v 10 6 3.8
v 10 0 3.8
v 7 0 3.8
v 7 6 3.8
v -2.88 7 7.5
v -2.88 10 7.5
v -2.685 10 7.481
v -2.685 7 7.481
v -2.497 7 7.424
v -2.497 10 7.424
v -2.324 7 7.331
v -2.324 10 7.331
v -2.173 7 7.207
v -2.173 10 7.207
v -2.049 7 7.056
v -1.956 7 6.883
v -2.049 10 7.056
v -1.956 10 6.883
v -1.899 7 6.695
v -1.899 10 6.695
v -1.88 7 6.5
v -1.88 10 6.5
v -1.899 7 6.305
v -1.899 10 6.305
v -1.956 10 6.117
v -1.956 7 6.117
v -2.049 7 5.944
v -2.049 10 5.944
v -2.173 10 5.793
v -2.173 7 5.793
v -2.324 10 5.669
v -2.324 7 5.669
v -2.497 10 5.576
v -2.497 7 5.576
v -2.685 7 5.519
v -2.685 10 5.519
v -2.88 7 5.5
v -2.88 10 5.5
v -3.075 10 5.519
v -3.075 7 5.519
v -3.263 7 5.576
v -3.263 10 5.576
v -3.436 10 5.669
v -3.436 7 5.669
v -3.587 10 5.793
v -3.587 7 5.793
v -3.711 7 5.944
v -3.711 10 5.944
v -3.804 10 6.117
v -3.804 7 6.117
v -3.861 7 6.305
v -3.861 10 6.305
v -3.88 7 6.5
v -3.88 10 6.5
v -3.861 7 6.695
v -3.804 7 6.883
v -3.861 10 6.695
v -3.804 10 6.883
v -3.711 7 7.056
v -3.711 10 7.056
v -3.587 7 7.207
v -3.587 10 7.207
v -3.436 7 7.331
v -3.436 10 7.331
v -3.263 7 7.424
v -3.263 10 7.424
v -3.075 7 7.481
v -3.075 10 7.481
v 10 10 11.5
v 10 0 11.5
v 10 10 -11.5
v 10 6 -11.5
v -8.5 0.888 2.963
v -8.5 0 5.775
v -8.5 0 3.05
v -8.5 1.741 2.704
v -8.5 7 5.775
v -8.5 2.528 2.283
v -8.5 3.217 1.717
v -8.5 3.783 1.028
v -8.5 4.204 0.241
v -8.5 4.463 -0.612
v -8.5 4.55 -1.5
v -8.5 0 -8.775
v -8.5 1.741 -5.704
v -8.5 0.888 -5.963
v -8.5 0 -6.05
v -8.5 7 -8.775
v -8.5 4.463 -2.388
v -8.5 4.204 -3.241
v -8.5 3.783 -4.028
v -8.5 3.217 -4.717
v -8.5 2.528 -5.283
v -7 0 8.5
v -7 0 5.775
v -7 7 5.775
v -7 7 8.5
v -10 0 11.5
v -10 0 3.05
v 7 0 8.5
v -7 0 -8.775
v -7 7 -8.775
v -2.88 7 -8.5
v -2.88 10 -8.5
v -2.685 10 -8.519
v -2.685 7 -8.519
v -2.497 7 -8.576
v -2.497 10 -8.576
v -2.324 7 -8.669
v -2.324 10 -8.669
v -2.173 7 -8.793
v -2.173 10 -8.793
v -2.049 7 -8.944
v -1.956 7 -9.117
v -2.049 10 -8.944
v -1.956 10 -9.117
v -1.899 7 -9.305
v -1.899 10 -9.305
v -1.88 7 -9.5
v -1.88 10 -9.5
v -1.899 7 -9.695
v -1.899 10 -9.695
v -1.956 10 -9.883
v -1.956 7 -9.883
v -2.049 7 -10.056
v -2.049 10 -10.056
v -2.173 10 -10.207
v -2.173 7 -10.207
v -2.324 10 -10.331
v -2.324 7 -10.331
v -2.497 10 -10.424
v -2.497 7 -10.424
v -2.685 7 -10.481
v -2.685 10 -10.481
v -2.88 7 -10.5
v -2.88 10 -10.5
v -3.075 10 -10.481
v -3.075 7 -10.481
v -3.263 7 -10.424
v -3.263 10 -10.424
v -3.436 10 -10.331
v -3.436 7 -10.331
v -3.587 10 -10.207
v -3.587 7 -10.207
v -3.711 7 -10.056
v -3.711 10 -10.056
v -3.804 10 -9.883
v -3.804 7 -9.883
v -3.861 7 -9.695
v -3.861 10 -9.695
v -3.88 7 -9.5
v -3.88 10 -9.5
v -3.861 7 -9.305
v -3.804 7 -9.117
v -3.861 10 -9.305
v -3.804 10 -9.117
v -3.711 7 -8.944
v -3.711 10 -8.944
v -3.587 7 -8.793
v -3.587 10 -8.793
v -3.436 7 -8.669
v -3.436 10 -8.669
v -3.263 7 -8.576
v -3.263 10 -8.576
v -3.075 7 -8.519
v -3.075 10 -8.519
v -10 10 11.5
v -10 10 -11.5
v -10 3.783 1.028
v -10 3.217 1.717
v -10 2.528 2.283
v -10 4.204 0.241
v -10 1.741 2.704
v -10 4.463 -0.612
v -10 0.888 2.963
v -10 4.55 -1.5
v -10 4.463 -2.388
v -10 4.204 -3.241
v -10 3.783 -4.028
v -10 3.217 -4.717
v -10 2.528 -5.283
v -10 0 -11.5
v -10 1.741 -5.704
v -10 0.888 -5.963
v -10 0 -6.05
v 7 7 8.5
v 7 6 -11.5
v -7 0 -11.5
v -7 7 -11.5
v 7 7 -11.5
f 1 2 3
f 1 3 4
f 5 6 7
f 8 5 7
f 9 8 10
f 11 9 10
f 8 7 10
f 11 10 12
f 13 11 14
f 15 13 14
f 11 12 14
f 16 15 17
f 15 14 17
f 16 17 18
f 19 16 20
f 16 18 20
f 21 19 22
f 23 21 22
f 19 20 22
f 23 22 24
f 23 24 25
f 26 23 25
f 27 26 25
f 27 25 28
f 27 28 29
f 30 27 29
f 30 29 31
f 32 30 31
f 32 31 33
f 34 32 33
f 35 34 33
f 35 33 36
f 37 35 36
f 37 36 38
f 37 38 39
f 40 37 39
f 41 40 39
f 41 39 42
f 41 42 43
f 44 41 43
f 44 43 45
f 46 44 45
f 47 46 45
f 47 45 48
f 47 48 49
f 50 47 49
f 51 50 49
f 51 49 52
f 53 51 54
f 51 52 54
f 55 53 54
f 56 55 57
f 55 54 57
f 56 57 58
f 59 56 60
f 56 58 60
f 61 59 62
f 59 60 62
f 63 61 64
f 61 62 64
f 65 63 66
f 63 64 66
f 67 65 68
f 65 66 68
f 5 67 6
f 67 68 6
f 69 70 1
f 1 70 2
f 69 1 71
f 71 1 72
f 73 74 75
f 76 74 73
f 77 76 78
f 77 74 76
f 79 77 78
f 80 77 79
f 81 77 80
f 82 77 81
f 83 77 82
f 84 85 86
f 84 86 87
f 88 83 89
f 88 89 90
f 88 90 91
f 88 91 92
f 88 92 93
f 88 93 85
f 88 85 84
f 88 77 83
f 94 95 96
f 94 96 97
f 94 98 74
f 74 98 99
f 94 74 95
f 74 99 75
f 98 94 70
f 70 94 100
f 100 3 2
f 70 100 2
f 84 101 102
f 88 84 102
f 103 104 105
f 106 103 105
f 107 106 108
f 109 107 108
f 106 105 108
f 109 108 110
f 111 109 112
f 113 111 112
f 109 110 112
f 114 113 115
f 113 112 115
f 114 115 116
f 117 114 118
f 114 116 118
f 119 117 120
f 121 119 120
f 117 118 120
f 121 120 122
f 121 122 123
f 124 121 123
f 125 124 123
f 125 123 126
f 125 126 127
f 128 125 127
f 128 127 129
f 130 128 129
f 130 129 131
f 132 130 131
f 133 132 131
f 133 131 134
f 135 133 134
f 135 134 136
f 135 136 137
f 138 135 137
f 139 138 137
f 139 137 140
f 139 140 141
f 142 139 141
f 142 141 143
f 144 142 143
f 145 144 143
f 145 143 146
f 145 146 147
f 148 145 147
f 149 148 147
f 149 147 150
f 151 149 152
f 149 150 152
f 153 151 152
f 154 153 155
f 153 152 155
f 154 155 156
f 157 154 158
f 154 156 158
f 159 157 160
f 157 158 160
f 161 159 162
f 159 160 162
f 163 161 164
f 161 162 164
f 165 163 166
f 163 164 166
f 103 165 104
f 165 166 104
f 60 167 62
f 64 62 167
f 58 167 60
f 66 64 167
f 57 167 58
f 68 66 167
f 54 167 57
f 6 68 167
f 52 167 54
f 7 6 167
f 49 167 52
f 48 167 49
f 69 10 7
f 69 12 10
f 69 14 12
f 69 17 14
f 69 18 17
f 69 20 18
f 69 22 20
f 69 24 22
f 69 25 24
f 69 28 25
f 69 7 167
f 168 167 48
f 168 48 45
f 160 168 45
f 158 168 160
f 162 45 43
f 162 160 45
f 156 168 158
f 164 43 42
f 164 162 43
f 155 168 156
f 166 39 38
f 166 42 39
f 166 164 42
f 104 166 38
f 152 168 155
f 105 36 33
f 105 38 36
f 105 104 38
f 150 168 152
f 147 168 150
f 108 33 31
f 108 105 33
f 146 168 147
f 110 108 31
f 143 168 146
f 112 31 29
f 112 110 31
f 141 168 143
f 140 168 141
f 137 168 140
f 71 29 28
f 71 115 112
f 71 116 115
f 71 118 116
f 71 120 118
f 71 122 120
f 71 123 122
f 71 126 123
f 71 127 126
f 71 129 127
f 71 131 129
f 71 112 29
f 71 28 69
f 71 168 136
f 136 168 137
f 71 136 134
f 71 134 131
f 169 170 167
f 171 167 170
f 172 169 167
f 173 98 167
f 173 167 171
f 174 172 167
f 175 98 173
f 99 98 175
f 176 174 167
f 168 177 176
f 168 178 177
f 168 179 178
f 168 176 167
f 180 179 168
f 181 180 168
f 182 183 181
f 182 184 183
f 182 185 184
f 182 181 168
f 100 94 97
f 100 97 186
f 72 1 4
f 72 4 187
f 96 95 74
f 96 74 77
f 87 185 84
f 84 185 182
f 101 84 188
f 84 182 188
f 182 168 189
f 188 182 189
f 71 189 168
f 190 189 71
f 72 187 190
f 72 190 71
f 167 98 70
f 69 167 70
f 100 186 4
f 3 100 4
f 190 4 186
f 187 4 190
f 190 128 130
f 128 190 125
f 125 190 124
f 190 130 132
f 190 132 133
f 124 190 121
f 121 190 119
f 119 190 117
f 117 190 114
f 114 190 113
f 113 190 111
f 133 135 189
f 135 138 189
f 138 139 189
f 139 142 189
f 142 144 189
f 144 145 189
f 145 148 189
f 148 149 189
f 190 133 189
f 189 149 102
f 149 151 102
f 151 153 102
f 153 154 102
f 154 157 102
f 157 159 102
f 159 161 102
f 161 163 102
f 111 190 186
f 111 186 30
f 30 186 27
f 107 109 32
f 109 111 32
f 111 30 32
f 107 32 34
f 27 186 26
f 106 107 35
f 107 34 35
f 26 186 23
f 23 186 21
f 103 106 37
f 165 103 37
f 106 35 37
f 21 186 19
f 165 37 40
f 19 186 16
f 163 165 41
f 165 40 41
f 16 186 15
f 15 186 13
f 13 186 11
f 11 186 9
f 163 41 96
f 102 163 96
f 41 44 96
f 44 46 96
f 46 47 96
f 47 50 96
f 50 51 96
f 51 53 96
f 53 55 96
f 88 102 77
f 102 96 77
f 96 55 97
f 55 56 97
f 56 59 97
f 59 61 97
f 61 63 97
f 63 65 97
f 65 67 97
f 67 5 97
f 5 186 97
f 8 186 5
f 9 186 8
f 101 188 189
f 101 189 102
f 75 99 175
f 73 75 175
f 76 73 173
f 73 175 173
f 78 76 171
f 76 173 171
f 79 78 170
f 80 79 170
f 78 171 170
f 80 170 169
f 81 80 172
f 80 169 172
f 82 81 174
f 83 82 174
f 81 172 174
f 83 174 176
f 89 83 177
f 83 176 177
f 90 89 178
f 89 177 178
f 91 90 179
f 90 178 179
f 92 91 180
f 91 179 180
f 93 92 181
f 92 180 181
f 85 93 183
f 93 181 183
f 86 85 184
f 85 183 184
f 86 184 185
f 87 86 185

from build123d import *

# Parameters (mm, degrees)
SKETCH1_W           = 20
SKETCH1_H           = 23
BOSS_EXTRUDE1_DEPTH = 10
CUT_EXTRUDE13_DEPTH = 7
SKETCH16_R          = 4.55
CUT_EXTRUDE14_DEPTH = 7
SKETCH18_W          = 14.55
SKETCH18_H          = 7
CUT_EXTRUDE16_DEPTH = 1.5
SKETCH20_R          = 1
CUT_EXTRUDE18_DEPTH = 5
SKETCH21_W          = 15.3
SKETCH21_H          = 6
CUT_EXTRUDE19_DEPTH = 5


with BuildPart() as part:
    # Sketch1 → Boss-Extrude1 (new body)
    with BuildSketch(Plane(origin=(0, 0, 0), x_dir=(1, 0, 0), z_dir=(0, 1, 0))):
        Rectangle(SKETCH1_W, SKETCH1_H)
    extrude(amount=BOSS_EXTRUDE1_DEPTH)

    # Sketch15 → Cut-Extrude13 (cut)
    with BuildSketch(Plane.XZ):
        Polygon((0, -11.5), (-7, -11.5), (-7, 8.5), (7, 8.5), (7, -11.5), align=None)
    extrude(amount=-CUT_EXTRUDE13_DEPTH, mode=Mode.SUBTRACT)

    # Sketch16 → Cut-Extrude14 (cut)
    with BuildSketch(Plane.ZY.offset(10)):
        with Locations((-1.5, 0)):
            Circle(SKETCH16_R)
    extrude(amount=-CUT_EXTRUDE14_DEPTH, mode=Mode.SUBTRACT)

    # Sketch18 → Cut-Extrude16 (cut)
    with BuildSketch(Plane(origin=(-7, 0, 0), x_dir=(0, 0, -1), z_dir=(1, 0, 0))):
        with Locations((1.5, 3.5)):
            Rectangle(SKETCH18_W, SKETCH18_H)
    extrude(amount=-CUT_EXTRUDE16_DEPTH, mode=Mode.SUBTRACT)

    # Sketch20 → Cut-Extrude18 (cut)
    with BuildSketch(Plane(origin=(0, 10, 0), x_dir=(1, 0, 0), z_dir=(0, 1, 0))):
        with Locations(Location((-2.88, 9.5, 0), (0, 0, 270))):
            Circle(SKETCH20_R)
        with Locations(Location((-2.88, -6.5, 0), (0, 0, 270))):
            Circle(SKETCH20_R)
    extrude(amount=-CUT_EXTRUDE18_DEPTH, mode=Mode.SUBTRACT)

    # Sketch21 → Cut-Extrude19 (cut)
    with BuildSketch(Plane(origin=(10, 0, 0), x_dir=(0, 0, -1), z_dir=(1, 0, 0))):
        with Locations((3.85, 3)):
            Rectangle(SKETCH21_W, SKETCH21_H)
    extrude(amount=-CUT_EXTRUDE19_DEPTH, mode=Mode.SUBTRACT)


solid = part.part
